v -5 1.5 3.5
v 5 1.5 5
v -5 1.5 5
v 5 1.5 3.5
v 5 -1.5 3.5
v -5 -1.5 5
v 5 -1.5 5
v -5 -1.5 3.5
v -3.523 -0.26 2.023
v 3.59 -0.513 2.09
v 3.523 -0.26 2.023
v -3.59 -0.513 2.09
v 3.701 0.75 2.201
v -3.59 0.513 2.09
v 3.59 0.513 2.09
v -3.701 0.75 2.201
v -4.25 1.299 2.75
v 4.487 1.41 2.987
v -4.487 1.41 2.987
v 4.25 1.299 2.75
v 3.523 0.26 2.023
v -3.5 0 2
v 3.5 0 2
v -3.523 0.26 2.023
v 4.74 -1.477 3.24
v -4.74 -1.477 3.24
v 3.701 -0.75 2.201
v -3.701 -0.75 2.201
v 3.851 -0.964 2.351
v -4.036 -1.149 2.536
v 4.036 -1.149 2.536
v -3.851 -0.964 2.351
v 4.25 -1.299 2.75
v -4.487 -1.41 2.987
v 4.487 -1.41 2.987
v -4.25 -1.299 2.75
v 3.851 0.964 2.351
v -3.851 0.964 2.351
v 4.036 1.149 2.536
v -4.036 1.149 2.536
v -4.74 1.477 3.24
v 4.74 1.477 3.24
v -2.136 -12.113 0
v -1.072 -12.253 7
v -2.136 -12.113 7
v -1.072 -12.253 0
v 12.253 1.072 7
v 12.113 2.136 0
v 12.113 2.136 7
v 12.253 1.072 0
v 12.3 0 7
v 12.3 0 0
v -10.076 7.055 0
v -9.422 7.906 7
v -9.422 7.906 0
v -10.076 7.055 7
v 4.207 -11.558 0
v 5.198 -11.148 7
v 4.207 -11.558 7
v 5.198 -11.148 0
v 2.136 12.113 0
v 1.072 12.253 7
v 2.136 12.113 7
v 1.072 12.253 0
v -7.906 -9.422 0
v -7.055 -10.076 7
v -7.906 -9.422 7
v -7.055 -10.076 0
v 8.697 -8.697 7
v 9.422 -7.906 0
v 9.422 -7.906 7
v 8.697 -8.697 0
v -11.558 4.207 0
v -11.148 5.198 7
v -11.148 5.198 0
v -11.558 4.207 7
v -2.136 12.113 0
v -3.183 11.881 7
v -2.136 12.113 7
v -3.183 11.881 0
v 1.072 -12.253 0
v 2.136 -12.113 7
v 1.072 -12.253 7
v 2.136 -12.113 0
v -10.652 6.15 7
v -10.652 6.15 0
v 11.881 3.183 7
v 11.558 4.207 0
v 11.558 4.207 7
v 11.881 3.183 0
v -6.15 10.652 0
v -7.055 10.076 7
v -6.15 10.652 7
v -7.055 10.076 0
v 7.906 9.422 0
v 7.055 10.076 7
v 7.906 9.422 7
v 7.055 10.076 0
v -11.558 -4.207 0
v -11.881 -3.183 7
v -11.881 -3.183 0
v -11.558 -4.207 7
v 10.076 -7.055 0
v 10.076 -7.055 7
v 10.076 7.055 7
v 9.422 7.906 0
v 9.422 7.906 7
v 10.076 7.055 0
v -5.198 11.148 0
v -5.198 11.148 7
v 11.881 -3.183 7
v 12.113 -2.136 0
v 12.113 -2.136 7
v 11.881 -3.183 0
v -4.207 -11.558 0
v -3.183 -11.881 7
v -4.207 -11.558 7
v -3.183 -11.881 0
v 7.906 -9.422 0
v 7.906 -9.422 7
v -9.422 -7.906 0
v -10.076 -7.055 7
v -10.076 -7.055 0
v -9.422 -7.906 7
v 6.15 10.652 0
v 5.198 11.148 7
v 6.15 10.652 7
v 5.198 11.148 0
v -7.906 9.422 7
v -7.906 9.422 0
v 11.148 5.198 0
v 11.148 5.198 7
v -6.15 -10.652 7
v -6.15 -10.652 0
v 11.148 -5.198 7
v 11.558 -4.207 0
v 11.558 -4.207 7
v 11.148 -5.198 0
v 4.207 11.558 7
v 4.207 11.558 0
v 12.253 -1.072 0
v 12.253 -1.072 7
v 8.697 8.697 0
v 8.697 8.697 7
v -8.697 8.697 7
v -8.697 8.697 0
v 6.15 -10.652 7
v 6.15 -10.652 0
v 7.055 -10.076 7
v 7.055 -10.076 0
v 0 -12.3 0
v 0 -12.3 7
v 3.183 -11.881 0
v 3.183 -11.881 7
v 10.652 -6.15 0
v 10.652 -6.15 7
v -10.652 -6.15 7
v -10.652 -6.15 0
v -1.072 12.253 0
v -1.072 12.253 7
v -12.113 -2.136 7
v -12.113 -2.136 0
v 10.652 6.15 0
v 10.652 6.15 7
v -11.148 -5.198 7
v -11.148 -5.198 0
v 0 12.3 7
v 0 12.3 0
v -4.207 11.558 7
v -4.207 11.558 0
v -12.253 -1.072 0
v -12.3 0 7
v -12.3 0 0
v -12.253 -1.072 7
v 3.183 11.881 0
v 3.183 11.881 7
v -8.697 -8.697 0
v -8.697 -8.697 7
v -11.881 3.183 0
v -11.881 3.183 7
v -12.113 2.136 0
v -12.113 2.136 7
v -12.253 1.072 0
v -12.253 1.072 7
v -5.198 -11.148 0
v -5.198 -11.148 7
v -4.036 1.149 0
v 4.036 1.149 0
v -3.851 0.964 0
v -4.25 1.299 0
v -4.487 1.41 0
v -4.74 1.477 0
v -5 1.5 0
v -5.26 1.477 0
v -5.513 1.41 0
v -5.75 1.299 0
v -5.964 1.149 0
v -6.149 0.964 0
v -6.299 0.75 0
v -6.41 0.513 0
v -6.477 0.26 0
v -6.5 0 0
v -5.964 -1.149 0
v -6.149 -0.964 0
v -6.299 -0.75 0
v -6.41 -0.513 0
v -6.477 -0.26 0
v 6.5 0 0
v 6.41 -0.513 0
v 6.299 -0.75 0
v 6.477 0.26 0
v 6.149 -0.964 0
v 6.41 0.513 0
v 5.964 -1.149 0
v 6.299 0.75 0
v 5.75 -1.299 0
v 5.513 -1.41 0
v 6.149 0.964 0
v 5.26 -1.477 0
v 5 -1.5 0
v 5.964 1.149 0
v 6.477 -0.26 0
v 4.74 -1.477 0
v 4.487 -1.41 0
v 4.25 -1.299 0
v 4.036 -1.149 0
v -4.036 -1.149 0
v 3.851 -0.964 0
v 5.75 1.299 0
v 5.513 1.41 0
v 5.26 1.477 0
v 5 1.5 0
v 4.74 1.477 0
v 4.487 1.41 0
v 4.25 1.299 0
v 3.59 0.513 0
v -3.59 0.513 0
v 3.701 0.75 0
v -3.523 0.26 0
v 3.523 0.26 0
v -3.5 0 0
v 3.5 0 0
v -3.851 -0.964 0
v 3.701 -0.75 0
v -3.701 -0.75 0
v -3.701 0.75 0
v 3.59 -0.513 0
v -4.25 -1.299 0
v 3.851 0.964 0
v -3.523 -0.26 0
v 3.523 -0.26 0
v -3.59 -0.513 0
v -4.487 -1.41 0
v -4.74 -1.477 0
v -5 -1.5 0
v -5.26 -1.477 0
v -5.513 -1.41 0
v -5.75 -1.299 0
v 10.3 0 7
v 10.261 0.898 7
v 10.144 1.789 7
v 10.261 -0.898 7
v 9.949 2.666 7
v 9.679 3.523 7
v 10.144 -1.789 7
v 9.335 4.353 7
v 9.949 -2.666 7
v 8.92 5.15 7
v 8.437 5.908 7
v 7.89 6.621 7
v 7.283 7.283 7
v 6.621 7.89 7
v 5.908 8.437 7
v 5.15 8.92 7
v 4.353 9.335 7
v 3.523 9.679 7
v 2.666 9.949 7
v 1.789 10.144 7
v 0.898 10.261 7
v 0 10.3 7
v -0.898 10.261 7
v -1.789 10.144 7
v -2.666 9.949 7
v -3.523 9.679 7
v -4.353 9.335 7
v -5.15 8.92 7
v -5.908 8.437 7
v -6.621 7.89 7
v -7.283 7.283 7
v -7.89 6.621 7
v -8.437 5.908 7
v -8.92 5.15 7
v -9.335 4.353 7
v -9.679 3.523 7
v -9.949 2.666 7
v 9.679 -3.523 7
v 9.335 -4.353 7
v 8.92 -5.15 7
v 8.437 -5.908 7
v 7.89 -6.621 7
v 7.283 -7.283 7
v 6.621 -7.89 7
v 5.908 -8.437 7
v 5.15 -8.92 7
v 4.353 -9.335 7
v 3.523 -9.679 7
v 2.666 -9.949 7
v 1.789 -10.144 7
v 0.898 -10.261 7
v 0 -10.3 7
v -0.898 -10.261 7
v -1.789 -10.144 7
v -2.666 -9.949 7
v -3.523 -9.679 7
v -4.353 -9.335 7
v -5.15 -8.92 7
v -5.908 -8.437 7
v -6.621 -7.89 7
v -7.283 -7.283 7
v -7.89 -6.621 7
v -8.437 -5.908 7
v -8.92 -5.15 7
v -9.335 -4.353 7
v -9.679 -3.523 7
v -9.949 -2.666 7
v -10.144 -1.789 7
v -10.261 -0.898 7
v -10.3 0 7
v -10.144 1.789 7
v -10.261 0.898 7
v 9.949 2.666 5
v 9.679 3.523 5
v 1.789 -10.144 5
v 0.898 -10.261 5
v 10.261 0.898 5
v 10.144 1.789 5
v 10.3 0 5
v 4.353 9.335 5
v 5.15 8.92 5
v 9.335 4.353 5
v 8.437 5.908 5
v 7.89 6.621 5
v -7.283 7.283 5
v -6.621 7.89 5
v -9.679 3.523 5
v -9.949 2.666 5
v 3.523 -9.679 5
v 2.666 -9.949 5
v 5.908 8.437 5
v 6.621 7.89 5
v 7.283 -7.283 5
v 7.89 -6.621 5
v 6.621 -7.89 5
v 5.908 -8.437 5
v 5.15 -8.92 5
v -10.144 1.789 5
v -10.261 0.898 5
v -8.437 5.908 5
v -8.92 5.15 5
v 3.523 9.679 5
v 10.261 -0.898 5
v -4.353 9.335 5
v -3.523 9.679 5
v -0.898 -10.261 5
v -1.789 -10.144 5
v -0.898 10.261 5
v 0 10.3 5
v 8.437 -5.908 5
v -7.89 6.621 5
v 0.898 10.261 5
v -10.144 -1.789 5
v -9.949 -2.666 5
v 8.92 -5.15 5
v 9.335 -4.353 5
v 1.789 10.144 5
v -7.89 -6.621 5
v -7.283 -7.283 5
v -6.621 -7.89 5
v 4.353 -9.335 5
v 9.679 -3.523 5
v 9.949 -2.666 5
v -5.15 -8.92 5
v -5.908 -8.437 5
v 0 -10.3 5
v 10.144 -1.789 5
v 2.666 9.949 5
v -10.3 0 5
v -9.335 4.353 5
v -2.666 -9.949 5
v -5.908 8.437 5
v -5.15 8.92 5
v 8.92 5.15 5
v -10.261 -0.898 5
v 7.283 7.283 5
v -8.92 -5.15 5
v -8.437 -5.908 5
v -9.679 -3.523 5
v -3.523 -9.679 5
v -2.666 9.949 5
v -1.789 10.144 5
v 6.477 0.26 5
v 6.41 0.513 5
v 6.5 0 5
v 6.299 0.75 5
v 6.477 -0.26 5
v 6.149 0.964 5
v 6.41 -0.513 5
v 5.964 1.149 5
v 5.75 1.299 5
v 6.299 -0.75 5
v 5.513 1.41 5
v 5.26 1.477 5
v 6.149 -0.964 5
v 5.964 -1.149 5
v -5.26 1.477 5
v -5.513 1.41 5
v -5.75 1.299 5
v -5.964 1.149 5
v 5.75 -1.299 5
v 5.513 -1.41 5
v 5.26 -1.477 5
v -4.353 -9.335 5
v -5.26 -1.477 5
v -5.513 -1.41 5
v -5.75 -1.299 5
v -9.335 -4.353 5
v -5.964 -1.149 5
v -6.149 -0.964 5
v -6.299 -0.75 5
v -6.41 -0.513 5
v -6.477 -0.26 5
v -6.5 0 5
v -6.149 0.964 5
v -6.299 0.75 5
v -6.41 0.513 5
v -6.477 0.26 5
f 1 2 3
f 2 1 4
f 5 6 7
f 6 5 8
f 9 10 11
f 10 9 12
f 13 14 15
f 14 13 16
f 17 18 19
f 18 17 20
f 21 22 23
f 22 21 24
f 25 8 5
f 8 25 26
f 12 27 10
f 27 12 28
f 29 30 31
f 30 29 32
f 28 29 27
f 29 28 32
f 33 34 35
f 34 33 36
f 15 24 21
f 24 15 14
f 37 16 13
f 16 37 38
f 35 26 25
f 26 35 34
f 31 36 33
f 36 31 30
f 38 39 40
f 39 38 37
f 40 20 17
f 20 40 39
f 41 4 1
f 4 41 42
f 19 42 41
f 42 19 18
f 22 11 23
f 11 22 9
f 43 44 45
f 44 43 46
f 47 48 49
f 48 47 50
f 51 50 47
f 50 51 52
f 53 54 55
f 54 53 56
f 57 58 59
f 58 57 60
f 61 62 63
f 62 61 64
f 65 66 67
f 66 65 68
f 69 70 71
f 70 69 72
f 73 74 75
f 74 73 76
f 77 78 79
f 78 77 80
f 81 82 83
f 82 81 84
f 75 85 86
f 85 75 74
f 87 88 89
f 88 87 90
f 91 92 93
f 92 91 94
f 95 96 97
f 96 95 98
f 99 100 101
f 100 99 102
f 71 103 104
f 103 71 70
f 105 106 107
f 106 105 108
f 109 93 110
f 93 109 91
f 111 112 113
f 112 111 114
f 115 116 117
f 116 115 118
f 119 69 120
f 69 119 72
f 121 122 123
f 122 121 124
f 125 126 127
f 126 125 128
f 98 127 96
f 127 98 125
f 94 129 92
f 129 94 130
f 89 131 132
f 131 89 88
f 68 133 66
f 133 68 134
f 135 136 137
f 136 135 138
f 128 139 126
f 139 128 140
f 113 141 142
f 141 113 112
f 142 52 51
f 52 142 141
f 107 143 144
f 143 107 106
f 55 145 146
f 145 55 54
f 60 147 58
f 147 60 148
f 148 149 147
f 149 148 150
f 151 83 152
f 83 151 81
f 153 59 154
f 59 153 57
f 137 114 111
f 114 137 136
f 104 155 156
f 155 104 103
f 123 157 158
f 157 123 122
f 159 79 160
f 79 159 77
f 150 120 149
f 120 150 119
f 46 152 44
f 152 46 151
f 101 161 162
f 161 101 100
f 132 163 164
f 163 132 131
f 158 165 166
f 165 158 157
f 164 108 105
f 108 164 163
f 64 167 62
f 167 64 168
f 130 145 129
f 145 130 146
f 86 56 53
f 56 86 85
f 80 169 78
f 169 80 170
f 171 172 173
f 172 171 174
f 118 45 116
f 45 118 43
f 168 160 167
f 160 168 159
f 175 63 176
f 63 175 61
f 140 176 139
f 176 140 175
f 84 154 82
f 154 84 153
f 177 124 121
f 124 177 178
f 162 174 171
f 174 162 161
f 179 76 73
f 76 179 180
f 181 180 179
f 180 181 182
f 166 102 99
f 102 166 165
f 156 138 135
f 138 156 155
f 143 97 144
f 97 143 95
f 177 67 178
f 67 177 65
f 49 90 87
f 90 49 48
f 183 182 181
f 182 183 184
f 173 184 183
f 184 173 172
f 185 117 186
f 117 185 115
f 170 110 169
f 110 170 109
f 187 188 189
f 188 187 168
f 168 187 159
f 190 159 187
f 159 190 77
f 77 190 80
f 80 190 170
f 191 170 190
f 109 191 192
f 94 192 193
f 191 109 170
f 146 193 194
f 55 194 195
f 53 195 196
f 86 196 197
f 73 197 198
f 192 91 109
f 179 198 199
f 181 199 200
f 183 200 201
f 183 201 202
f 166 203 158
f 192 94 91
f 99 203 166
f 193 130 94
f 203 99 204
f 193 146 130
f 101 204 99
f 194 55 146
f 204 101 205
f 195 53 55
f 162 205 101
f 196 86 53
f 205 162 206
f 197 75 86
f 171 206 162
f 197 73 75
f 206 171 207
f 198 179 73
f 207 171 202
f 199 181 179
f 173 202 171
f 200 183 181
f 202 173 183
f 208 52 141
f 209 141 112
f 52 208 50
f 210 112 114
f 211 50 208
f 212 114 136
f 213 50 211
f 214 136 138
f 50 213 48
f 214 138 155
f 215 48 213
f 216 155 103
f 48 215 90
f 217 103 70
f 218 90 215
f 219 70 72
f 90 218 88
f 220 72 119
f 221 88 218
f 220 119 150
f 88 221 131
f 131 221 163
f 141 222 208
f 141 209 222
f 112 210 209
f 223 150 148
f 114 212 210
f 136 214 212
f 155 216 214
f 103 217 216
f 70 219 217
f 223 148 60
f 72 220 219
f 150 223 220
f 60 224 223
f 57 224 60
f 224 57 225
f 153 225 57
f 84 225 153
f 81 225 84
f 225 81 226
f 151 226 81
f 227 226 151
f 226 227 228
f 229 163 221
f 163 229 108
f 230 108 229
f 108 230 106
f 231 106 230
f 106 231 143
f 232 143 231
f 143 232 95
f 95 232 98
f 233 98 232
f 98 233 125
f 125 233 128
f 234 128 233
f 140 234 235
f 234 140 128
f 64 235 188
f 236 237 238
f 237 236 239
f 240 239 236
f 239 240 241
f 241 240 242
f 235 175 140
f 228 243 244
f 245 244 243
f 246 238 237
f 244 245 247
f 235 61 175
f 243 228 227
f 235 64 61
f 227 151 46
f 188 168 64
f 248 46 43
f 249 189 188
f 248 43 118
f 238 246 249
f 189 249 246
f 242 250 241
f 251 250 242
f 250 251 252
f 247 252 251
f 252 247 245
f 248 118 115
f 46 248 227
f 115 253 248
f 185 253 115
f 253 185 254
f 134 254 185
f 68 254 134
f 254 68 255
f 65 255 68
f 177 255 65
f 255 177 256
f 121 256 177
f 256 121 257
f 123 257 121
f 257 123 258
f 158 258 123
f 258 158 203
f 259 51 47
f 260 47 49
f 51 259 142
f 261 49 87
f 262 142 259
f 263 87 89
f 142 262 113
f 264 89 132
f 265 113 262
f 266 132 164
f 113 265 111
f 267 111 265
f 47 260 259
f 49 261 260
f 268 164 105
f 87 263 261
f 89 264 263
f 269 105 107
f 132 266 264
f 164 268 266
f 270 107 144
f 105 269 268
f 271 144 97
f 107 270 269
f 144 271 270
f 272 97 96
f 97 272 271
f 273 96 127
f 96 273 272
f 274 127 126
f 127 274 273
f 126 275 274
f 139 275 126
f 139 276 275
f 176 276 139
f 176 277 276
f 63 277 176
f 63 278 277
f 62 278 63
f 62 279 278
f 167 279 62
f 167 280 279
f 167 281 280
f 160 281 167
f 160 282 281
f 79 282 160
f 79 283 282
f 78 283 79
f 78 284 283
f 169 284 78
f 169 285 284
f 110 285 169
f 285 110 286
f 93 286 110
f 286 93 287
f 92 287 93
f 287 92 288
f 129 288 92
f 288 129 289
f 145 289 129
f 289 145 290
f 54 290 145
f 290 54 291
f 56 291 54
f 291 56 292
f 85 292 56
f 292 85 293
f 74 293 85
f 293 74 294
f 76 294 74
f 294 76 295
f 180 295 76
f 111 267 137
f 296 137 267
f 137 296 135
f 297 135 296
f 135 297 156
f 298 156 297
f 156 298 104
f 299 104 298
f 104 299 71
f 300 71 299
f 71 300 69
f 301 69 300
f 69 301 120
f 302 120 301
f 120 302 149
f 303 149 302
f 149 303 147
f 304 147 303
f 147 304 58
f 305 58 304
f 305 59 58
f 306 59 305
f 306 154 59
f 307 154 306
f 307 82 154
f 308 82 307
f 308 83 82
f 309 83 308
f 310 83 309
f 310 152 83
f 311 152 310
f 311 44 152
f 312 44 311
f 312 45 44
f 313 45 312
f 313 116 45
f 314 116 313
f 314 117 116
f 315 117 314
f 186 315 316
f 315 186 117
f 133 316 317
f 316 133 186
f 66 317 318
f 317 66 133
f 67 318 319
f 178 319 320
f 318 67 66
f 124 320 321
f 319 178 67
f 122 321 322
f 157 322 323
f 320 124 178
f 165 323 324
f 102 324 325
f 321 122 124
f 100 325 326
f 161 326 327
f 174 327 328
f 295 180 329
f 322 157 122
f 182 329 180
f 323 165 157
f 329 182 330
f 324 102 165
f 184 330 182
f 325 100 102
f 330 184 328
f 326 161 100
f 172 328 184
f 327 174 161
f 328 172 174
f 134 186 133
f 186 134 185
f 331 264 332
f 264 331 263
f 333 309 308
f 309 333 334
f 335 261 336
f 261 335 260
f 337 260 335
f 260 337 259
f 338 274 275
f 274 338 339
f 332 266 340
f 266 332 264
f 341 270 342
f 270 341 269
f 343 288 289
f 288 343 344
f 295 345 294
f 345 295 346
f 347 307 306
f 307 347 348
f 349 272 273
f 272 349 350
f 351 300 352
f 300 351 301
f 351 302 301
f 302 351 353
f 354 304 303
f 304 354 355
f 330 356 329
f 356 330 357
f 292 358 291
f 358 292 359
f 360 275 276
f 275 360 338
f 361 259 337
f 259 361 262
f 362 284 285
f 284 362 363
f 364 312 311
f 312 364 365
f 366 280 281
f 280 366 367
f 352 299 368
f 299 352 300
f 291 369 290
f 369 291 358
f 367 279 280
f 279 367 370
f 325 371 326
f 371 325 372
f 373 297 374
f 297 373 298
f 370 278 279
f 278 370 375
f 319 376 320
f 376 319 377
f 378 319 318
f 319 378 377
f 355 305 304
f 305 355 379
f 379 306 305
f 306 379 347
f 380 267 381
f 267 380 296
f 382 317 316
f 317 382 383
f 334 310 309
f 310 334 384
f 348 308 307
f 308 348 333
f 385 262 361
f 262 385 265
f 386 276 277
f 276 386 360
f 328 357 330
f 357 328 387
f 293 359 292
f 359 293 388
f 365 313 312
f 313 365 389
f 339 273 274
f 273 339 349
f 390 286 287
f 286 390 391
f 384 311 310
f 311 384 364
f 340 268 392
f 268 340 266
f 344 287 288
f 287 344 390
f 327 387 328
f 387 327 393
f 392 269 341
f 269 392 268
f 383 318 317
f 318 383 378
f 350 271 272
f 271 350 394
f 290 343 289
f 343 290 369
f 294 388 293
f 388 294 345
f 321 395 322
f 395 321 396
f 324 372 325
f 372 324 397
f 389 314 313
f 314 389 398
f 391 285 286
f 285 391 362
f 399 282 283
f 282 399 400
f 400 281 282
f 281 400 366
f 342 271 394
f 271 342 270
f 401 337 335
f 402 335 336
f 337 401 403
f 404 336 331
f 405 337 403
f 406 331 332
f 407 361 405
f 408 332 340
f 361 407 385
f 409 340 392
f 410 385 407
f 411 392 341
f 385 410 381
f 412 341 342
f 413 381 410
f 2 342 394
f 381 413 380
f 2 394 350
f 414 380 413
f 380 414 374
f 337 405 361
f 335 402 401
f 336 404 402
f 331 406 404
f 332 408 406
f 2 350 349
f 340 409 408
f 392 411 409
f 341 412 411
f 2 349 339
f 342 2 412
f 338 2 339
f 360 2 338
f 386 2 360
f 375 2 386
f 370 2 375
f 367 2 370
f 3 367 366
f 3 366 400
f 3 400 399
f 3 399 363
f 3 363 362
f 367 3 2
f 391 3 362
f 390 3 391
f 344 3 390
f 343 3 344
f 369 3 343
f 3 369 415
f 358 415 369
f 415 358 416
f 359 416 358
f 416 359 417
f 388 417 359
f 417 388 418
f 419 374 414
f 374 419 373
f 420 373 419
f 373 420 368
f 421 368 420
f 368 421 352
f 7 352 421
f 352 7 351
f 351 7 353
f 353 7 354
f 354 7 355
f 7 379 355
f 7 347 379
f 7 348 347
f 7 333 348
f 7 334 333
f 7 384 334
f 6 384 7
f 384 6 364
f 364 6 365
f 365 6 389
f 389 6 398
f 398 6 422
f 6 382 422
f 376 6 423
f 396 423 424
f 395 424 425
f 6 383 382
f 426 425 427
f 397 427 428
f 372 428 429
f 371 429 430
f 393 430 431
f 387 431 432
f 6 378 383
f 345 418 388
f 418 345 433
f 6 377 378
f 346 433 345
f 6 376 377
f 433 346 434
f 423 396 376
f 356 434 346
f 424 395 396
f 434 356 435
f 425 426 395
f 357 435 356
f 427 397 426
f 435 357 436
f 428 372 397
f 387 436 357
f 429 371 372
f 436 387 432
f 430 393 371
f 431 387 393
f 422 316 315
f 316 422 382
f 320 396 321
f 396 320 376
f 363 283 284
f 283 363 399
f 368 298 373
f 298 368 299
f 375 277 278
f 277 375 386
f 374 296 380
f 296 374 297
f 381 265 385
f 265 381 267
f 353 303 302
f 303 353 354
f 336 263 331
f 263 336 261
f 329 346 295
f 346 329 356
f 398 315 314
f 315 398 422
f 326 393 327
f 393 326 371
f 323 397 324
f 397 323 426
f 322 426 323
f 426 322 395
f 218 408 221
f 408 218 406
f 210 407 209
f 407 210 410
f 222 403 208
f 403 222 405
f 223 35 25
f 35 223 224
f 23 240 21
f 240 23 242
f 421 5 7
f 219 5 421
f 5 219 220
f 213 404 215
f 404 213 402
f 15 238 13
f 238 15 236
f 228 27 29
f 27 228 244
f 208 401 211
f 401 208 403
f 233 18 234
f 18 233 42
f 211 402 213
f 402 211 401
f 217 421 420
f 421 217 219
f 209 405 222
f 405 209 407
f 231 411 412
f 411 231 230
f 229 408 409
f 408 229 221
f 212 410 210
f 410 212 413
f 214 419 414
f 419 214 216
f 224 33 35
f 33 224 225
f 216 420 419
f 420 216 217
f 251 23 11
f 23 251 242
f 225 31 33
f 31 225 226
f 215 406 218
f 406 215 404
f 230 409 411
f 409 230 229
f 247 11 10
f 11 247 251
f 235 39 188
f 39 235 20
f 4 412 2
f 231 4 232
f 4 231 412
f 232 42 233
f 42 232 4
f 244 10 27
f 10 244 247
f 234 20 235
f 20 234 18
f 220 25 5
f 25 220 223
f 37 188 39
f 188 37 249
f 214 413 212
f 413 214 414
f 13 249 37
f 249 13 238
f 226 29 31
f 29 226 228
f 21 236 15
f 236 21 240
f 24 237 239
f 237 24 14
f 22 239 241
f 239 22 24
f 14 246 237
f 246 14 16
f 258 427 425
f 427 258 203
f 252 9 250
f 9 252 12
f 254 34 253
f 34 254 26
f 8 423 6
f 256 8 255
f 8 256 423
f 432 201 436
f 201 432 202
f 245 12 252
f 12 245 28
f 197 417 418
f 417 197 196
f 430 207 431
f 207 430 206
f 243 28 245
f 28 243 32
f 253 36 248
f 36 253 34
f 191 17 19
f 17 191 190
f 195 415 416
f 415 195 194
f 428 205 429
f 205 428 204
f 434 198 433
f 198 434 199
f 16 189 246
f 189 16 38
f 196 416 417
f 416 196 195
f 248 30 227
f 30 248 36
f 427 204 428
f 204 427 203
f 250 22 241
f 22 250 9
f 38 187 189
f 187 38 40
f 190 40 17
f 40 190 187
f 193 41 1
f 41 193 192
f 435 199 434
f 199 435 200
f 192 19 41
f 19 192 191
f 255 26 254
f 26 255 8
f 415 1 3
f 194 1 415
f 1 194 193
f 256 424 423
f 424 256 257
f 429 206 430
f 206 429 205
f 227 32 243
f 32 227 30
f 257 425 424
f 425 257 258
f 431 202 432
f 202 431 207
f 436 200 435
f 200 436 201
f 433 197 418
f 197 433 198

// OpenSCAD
tool_diameter = 24.6;         // [0.0:60.0]
tool_height = 7;              // [0.0:30.0]
magnet_diameter = 20.6;       // [0.0:60.0]
magnet_height = 2;            // [0.0:30.0]
wire_diameter = 3;            // [0.0:10.0]
distance_between_holes = 10;	// [0.0:60.0]

magnet_radius = magnet_diameter / 2;
tool_radius = tool_diameter / 2;
wire_radius = wire_diameter / 2;

difference()
{

  cylinder(h = tool_height, r = tool_radius, $fn=72);

  // magnet
  translate([0,0,tool_height-magnet_height])
  {
    cylinder(h = magnet_height + 0.01, r = magnet_radius, $fn=72);
  }

  // hole for left wire
  translate([distance_between_holes / 2, 0, -0.5])
  {
    cylinder(h = tool_height + 0.01, r = wire_radius, $fn=36);
  }

  // hole for right wire
  translate([- distance_between_holes / 2, 0, -0.5])
  {
    cylinder(h = tool_height + 0.1, r = wire_radius, $fn=36);
  }

  // space connecting left and right hole
  translate([-distance_between_holes/2, 0, tool_height-magnet_height-wire_radius])
  {
    translate([0, -wire_radius, 0])
    {
      cube(size = [distance_between_holes, wire_radius*2 , wire_radius+0.01]);
    }

    rotate([0,90,0])
    {
      cylinder(h = distance_between_holes, r = wire_radius, $fn=36);
    }
  }
}
